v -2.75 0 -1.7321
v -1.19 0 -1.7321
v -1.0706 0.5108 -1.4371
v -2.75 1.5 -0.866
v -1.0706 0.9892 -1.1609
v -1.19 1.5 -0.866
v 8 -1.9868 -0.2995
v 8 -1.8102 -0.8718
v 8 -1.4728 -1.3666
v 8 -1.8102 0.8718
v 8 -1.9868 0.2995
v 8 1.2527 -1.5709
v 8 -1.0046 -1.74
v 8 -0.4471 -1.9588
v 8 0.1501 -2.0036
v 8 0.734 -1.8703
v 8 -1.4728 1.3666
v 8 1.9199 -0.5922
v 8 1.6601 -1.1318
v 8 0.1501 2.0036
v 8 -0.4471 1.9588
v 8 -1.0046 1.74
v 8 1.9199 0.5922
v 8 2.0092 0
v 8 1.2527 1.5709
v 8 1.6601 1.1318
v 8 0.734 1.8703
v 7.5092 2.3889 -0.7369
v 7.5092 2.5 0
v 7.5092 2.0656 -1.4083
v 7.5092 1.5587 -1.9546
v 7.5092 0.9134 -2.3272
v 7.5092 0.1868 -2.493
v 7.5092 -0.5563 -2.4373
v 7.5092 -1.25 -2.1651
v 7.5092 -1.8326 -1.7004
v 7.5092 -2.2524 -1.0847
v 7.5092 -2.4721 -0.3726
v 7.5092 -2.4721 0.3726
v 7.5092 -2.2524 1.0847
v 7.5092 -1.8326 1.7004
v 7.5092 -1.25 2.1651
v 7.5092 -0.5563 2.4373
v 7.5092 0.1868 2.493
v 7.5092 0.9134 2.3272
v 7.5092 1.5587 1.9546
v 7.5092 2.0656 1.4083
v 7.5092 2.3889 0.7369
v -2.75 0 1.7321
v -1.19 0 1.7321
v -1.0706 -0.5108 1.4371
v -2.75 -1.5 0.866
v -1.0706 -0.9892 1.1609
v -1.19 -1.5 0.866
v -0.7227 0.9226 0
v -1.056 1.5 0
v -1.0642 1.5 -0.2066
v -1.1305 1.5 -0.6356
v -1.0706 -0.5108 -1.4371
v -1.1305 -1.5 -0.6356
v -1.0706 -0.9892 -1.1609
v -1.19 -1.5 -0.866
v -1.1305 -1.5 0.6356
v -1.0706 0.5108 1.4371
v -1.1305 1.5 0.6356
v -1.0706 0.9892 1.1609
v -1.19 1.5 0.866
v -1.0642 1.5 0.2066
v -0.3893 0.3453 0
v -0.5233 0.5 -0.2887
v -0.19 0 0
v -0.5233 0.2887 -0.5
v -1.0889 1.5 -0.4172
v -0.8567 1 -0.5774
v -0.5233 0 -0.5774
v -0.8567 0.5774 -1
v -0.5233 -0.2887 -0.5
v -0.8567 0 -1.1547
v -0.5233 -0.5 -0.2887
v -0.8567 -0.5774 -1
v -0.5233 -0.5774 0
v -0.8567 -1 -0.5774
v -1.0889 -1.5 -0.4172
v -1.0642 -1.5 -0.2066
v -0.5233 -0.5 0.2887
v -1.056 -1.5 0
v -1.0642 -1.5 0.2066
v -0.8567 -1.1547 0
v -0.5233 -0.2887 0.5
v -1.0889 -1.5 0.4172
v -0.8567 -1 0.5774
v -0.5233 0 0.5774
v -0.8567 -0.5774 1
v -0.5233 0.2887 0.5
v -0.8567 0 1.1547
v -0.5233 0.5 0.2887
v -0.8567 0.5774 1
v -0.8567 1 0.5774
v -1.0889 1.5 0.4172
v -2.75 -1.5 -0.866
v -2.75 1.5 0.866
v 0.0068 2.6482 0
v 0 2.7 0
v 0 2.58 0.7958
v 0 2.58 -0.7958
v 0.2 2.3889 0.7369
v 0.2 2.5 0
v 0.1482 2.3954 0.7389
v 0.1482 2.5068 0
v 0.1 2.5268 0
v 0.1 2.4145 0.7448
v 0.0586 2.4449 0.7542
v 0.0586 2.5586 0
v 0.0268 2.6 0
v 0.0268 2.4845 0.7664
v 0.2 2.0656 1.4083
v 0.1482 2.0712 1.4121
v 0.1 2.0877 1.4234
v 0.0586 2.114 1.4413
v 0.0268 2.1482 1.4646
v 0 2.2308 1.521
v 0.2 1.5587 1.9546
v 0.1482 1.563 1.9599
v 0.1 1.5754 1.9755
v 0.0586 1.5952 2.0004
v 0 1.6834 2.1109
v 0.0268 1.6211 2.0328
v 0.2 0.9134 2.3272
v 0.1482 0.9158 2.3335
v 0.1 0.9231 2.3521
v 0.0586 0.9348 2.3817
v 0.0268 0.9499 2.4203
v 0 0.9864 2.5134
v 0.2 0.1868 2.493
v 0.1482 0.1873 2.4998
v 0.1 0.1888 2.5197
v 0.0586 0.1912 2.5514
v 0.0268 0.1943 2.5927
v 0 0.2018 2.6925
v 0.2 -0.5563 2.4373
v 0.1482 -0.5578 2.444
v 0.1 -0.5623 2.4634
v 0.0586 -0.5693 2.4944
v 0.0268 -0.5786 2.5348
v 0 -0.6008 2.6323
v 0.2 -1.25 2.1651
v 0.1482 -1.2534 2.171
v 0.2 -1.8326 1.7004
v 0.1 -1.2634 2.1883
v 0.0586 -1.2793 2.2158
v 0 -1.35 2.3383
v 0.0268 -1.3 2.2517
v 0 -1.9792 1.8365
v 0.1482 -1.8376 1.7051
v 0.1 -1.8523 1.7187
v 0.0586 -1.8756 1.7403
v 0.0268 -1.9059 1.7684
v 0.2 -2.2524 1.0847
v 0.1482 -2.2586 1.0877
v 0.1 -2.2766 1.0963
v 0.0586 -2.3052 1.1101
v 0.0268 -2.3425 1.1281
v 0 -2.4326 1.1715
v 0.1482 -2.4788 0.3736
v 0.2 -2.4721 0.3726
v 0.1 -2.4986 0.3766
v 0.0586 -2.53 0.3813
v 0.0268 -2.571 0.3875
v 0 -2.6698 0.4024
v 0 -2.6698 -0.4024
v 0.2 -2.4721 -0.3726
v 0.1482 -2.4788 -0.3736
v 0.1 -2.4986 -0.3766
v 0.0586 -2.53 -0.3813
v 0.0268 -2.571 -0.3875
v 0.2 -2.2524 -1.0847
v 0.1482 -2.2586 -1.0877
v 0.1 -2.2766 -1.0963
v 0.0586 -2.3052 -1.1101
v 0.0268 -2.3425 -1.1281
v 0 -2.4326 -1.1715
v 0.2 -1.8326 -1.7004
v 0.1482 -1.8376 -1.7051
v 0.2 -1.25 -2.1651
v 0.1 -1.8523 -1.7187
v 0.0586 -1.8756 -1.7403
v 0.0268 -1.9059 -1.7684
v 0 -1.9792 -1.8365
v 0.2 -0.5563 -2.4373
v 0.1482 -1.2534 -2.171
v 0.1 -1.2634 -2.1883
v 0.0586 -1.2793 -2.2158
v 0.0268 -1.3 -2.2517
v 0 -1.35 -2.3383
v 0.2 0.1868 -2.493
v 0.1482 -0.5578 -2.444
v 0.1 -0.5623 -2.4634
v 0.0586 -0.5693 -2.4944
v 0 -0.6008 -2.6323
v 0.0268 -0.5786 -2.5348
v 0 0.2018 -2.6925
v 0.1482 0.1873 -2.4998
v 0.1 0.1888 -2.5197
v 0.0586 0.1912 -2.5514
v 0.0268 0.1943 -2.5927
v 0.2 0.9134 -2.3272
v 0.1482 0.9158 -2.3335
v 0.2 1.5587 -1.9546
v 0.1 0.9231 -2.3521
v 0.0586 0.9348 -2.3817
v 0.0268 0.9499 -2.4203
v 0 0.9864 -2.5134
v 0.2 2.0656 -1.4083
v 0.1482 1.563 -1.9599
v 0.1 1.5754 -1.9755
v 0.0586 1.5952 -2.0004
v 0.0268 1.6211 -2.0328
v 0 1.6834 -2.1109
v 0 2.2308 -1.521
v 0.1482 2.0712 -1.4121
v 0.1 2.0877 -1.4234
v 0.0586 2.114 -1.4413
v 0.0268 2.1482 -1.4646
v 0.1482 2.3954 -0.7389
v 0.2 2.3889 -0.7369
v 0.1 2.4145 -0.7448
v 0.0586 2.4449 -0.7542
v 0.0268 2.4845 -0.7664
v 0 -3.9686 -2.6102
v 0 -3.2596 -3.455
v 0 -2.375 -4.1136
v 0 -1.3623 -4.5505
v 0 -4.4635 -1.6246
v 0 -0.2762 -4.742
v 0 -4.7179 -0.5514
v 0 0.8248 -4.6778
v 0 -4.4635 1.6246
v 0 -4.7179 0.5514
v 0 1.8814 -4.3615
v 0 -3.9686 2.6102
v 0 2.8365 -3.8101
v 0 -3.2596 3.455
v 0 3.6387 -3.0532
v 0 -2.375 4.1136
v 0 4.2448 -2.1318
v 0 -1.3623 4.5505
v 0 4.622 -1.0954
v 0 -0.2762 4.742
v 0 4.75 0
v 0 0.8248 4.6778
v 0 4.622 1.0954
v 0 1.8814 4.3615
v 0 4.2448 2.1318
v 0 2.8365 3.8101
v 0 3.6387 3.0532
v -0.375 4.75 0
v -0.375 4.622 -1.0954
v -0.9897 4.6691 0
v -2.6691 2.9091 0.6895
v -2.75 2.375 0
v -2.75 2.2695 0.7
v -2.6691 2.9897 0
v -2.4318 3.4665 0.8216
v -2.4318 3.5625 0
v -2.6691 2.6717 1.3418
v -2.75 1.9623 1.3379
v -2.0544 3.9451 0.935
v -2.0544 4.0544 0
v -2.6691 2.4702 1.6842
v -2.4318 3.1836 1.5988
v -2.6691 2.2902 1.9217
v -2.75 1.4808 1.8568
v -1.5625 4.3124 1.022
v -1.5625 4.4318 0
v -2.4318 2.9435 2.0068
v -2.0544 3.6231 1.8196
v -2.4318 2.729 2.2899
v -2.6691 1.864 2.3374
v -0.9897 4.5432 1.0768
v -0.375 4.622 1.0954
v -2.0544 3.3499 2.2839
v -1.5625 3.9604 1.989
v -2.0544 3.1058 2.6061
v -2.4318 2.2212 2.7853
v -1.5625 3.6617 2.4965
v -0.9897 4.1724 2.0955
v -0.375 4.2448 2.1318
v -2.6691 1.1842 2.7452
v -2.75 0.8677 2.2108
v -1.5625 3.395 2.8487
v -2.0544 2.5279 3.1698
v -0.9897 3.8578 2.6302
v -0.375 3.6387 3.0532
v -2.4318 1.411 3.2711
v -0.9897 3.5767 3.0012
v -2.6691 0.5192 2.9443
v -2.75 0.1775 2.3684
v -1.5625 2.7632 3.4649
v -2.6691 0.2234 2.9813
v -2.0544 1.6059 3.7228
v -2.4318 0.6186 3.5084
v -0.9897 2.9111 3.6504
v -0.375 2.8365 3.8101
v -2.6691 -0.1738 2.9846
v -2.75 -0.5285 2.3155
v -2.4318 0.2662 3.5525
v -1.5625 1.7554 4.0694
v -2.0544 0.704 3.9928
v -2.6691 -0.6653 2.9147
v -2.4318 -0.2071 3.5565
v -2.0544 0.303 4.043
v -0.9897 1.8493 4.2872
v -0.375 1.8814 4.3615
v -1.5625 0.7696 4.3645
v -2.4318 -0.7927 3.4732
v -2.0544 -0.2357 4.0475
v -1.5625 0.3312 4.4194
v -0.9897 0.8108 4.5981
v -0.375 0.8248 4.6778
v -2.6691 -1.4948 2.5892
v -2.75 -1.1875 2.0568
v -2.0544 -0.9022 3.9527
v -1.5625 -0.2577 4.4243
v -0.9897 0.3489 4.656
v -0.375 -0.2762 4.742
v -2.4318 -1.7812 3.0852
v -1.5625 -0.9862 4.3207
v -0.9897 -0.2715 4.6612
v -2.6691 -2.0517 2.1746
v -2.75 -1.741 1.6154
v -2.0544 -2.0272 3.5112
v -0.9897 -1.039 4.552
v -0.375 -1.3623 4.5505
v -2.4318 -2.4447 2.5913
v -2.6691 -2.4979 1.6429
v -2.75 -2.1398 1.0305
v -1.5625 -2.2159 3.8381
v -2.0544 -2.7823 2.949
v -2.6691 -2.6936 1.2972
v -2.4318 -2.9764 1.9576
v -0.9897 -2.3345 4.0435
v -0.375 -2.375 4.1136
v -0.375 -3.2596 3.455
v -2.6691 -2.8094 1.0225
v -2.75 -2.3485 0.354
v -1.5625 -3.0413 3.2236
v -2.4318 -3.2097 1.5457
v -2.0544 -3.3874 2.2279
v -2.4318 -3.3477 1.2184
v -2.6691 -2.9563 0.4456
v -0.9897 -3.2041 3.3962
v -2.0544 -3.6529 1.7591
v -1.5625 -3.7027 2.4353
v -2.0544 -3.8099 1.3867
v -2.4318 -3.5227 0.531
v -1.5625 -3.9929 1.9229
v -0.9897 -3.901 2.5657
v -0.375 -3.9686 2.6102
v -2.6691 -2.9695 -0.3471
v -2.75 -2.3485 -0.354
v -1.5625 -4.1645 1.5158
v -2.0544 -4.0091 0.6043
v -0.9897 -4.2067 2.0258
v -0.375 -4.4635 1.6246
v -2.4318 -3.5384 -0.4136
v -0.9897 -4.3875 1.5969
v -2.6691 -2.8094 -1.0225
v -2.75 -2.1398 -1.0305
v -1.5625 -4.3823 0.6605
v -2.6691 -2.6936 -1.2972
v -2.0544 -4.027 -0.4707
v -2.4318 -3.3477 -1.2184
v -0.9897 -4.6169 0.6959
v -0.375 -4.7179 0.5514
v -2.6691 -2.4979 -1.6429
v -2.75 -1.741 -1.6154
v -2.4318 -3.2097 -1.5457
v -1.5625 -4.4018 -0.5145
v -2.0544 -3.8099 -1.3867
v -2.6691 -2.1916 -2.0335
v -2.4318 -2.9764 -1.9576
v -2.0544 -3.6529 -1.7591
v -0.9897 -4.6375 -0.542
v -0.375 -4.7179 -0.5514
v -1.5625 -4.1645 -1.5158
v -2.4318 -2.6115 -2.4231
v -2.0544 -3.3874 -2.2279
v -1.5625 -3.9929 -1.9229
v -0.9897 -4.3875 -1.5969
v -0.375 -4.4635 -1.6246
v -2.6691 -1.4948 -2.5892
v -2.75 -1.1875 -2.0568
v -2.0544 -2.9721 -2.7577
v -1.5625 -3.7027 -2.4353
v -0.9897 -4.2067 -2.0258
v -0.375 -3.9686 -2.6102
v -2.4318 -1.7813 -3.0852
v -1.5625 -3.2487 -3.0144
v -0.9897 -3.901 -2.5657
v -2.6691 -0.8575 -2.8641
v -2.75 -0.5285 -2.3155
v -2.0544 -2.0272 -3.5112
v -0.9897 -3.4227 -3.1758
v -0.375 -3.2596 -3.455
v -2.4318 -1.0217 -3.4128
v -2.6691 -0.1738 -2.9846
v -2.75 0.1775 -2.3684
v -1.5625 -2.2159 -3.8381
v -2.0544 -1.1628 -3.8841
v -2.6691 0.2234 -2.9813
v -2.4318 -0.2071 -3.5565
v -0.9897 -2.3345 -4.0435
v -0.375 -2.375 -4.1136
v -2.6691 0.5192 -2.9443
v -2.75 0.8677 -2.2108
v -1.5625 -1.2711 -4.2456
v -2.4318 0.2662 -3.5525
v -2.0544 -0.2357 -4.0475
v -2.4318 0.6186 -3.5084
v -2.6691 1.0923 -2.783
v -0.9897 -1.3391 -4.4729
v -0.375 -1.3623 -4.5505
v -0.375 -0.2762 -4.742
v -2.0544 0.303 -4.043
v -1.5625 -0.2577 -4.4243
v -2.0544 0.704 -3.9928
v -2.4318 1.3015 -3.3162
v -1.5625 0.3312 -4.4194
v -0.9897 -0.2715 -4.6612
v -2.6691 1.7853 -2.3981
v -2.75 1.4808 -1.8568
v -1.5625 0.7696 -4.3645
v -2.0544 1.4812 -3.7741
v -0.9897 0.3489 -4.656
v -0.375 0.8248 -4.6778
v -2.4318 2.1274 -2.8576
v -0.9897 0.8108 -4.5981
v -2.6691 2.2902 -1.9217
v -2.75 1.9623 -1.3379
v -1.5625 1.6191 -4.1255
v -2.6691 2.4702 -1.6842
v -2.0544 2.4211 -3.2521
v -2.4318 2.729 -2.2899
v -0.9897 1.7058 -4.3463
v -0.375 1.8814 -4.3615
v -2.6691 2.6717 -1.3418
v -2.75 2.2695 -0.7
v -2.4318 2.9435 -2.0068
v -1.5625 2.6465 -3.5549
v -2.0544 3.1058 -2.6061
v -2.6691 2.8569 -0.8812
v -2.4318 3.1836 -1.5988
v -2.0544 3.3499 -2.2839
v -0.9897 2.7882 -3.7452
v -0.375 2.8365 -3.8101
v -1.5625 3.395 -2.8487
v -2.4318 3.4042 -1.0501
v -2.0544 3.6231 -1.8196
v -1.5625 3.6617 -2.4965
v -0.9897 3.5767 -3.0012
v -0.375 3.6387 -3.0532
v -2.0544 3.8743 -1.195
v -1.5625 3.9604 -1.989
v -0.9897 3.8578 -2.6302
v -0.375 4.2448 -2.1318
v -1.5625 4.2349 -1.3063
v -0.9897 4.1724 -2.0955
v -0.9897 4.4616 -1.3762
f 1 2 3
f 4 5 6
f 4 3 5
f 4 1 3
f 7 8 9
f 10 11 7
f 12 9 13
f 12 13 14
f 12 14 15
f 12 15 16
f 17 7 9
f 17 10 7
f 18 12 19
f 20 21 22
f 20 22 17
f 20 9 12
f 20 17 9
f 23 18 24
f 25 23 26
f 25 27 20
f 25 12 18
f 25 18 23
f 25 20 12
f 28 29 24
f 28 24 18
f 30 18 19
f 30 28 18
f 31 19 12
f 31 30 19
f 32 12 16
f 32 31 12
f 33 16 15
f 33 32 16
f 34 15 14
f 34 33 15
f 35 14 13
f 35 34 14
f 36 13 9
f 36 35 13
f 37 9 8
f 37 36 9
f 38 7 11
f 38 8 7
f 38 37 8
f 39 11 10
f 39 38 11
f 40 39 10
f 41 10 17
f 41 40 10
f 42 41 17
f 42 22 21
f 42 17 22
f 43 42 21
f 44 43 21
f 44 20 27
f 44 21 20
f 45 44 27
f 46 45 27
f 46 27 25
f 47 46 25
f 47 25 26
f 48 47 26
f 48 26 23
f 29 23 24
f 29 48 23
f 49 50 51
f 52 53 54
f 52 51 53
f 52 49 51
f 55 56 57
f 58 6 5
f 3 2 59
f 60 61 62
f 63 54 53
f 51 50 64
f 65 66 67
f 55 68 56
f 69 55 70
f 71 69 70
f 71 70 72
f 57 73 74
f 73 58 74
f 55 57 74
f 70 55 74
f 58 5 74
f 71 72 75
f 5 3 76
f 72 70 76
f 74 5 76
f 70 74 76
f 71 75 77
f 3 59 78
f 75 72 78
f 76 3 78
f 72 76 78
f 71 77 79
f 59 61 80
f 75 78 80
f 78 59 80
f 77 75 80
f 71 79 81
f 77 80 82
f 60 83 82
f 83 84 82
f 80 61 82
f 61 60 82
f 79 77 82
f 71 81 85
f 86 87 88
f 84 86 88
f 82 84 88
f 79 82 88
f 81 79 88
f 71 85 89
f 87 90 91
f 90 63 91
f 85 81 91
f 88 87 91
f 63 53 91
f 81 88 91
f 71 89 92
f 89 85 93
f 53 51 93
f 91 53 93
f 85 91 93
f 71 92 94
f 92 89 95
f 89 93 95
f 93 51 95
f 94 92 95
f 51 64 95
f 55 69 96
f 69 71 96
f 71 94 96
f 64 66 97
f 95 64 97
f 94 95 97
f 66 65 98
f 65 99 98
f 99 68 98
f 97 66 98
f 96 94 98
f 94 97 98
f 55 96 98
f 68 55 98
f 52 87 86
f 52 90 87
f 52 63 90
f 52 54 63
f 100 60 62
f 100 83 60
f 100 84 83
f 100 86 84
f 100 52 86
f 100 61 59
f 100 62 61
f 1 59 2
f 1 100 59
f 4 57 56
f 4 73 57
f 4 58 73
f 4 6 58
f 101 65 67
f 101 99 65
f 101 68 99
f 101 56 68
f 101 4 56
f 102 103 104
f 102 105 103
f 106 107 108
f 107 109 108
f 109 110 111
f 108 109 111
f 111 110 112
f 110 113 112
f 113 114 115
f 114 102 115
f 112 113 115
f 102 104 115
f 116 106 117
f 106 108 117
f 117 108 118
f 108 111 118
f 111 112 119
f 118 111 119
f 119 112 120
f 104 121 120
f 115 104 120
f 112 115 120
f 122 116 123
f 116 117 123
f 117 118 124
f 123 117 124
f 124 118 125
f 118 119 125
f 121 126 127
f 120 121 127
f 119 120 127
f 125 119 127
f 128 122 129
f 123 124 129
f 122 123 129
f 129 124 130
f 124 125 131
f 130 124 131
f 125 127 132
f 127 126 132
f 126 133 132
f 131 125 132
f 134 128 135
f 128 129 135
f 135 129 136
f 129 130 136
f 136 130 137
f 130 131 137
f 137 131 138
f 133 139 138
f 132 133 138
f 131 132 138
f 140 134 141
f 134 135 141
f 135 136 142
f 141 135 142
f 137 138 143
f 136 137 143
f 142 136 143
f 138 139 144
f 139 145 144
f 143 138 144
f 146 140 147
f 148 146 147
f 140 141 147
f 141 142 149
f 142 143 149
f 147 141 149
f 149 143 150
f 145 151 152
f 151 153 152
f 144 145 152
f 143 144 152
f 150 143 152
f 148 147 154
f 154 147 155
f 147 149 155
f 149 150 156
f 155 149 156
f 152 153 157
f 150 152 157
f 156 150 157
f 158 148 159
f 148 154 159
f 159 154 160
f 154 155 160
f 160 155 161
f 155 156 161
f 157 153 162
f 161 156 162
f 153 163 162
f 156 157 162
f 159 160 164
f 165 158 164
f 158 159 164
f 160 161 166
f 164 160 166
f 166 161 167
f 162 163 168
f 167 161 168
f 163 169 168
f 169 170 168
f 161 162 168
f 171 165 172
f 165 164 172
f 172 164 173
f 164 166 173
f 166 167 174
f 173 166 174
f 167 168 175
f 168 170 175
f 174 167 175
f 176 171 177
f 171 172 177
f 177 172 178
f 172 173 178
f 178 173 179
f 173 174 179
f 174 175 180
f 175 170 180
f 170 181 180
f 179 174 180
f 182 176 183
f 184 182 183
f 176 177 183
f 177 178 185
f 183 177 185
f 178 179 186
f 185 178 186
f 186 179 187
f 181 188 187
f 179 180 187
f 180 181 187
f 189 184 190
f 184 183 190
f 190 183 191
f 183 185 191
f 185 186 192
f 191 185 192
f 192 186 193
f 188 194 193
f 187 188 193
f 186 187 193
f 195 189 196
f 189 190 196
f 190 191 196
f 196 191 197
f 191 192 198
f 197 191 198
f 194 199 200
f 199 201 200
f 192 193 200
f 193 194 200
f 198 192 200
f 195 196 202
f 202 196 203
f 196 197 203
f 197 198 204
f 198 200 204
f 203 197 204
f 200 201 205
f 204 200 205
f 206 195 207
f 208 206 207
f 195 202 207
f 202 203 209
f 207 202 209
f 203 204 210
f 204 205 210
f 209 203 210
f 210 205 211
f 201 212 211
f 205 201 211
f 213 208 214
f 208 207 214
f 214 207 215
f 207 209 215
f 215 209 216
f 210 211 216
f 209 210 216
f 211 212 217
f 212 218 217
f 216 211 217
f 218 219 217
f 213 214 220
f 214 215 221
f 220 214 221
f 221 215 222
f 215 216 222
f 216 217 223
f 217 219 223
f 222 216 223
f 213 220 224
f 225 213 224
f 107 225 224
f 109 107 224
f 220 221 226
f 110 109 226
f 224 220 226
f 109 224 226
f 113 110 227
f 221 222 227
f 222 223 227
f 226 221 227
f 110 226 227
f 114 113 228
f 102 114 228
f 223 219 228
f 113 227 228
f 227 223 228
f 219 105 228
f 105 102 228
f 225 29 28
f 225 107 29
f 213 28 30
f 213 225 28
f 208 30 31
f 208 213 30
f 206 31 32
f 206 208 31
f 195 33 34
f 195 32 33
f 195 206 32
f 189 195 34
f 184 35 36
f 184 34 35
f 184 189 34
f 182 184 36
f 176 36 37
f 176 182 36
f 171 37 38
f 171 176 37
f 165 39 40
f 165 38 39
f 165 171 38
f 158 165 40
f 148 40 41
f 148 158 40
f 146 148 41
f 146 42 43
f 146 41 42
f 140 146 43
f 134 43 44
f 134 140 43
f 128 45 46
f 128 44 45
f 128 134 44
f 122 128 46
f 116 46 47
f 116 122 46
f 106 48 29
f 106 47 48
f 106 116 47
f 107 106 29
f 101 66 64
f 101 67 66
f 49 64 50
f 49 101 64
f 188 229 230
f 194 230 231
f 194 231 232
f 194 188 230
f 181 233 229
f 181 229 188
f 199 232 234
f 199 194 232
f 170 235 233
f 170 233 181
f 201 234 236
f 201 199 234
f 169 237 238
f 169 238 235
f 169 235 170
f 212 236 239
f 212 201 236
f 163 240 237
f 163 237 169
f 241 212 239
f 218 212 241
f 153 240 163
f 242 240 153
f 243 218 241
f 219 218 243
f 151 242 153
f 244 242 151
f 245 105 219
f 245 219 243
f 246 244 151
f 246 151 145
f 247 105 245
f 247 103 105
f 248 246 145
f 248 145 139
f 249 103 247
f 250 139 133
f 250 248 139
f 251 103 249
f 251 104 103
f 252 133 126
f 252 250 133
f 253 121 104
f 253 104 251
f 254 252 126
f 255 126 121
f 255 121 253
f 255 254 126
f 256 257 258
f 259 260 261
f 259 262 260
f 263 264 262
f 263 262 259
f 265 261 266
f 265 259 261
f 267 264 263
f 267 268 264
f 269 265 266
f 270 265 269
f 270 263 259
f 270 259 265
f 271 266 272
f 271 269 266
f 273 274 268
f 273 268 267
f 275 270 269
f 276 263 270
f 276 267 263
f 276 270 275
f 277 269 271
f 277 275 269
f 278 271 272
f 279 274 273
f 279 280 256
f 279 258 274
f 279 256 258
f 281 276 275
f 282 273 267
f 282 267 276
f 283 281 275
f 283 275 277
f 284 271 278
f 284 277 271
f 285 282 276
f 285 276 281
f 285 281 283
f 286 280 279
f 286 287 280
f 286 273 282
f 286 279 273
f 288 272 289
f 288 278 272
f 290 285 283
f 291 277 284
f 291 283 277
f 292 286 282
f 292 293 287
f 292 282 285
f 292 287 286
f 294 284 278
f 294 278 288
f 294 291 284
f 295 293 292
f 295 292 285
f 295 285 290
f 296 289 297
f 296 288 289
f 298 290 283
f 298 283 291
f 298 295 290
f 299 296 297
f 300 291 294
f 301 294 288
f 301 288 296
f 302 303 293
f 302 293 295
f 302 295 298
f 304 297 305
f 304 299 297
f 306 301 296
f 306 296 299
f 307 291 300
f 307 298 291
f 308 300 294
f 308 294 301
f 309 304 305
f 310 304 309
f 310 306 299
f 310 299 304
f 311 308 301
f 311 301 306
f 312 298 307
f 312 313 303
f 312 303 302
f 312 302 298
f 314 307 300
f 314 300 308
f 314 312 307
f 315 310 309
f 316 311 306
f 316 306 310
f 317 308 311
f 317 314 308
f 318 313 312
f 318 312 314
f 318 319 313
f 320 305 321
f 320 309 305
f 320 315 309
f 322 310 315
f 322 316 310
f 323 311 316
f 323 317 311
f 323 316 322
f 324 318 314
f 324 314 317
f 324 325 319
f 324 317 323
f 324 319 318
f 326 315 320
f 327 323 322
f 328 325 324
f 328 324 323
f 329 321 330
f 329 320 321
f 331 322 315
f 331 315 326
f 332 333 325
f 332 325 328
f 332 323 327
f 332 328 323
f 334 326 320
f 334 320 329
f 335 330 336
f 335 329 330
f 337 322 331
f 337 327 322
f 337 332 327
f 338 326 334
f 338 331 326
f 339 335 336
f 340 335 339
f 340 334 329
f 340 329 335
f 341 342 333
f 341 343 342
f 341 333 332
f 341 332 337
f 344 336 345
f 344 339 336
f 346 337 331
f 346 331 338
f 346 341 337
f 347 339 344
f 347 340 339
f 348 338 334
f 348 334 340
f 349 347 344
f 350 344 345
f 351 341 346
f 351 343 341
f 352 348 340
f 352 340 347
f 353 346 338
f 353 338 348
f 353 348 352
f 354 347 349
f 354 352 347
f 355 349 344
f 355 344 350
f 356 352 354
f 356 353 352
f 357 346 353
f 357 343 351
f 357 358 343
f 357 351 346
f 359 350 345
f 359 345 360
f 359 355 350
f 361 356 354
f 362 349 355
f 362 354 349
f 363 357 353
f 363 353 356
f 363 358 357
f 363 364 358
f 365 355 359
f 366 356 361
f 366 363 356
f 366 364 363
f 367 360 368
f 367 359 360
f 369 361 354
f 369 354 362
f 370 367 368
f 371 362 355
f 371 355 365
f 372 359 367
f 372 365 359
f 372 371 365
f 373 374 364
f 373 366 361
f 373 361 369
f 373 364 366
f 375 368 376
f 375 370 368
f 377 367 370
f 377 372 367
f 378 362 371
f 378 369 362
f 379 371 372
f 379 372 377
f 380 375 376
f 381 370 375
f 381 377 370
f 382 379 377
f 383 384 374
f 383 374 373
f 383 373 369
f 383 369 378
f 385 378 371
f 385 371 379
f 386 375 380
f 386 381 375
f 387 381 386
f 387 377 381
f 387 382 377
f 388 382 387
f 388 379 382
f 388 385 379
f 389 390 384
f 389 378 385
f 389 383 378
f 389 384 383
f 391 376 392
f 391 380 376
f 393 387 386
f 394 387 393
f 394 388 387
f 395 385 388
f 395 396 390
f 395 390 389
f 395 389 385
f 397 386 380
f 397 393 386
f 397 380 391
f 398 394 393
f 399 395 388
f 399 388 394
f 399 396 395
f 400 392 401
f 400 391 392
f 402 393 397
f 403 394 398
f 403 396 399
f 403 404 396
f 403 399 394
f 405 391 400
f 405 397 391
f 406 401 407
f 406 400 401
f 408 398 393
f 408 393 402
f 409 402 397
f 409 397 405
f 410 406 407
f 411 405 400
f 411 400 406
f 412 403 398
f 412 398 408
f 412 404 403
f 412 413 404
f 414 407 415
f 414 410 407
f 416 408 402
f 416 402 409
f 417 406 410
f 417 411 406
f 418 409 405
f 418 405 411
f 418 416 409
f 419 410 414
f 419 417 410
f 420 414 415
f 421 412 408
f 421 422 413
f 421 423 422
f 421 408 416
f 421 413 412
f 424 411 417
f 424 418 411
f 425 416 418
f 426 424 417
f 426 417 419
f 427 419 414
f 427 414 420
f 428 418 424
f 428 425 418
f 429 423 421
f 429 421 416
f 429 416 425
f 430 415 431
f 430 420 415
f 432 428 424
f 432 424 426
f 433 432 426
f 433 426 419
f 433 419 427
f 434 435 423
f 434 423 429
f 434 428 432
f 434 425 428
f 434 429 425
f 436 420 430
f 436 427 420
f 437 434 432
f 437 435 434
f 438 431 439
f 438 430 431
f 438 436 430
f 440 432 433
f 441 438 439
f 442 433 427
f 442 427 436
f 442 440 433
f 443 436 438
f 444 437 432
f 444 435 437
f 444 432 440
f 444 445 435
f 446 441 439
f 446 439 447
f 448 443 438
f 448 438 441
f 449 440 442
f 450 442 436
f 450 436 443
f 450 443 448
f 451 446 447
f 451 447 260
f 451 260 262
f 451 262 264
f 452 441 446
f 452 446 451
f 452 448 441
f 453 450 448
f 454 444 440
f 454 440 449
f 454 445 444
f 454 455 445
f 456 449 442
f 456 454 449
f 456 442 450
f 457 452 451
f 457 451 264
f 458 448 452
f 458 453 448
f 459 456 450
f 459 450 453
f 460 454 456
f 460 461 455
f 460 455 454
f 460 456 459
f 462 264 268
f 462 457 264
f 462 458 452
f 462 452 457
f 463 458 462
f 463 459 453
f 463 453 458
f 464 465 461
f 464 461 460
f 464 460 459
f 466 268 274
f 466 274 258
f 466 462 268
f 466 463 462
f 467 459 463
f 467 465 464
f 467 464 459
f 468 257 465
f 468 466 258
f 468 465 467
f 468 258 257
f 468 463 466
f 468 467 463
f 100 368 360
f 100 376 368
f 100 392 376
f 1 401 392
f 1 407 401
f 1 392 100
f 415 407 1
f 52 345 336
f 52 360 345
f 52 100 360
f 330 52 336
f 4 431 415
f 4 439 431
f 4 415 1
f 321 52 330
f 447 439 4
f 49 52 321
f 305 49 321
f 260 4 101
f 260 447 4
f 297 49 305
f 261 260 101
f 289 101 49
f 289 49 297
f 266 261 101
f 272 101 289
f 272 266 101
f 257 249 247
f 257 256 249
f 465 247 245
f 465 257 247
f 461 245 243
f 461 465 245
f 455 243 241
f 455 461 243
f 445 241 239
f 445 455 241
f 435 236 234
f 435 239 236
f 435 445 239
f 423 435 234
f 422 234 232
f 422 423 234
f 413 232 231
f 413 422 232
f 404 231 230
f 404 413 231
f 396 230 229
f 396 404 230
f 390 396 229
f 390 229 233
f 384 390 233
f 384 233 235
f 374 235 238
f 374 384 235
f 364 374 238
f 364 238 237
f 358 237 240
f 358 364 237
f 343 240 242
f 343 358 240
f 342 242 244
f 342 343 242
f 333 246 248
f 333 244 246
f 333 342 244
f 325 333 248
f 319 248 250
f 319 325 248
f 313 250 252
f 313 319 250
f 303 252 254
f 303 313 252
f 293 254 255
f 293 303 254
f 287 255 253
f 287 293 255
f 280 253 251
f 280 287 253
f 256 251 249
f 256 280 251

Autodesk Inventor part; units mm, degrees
ref_plane "YZ Plane" through (0, 0, 0) normal (1, 0, 0) x (0, 1, 0)
ref_plane "XZ Plane" through (0, 0, 0) normal (0, 1, 0) x (-1, 0, 0)
sketch "Эскиз1" plane through (0, 0, 0) normal (0, 0, 1) x (1, 0, 0)
  line L0 (-0.19, 0) -> (8, 0)
  line L1 (8, 0) -> (8, 2.5)
  line L2 (8, 2.5) -> (1.6, 2.5)
  line L3 (1.6, 2.5) -> (1.1092, 2.5)
  line L4 (1.1092, 2.5) -> (0, 2.5)
  line L5 (0, 2.5) -> (0, 4.75)
  line L6 (0, 4.75) -> (-2.75, 4.75)
  line L7 (-2.75, 4.75) -> (-2.75, 1.7321)
  line L8 (-2.75, 1.7321) -> (-1.19, 1.7321)
  line L9 (-1.19, 1.7321) -> (-0.19, 0)
  line L10 (-4.9, 0) -> (10.15, 0) projected
  line L11 (0, -0.95) -> (0, 5.7) projected
  line L12 (1.6, 2.5) -> (0, 2.5) construction
  dimension "d0" = 6.4
  dimension "d1" = 0.4908
  dimension "d2" = 2.75
  dimension "d3" = 1.56
  dimension "d4" = 60
  dimension "d5" = 5
  dimension "d6" = 5
  dimension "d7" = 3.4641
  dimension "d8" = 9.5
  dimension "d19" = 8
revolve "Базовый элемент" add sketch "Эскиз1" angle 360 about axis through (-0.19, 0, 0) along (1, 0, 0)
sketch "Эскиз2" plane through (-2.75, 0, 0) normal (-1, 0, 0) x (0, 0, 1)
  circle A0 centre (0, 0) radius 1.7321 projected
  line L0 (0, -6.65) -> (0, 6.65) projected
  line L1 (-6.65, 0) -> (6.65, 0) projected
  line L2 (1.7321, 0) -> (0.866, -1.5)
  line L3 (0.866, -1.5) -> (-0.866, -1.5)
  line L4 (-0.866, -1.5) -> (-1.7321, 0)
  line L5 (-1.7321, 0) -> (-0.866, 1.5)
  line L6 (-0.866, 1.5) -> (0.866, 1.5)
  line L7 (0.866, 1.5) -> (1.7321, 0)
extrude "Паз" add sketch "Эскиз2" against normal up to next contours L7 A0 | A0 L2 | L6 L0 A0 | A0 L0 L3 | L0 L6 A0 | A0 L3 L0 | L4 A0 | A0 L5
fillet "Сопряжение1" radius 2.375 1 edges at (-2.75, -4.75, 0)
thread "Резьба" size "M5x0.8" class "4g6g" standard "ANSI Metric M Profile" length 6.4
chamfer "Фаска1" distance 0.4908 distance2 0.4908 1 edges at (8, -2.5, 0) measured on face at (8, -0.6238, -0.819)
fillet "Сопряжение2" radius 0.2 1 edges at (0, -2.5, 0)
ref_plane "Work Plane1" through (30, 0, 0) normal (0, -0.5, 0.866) x (1, 0, 0)
equation "\"d0\" = GEL"
equation "\"d1\" = GAL"
equation "\"d2\" = KOH"
equation "\"d3\" = INTI"
equation "\"d5\" = GD"
equation "\"d6\" = BDM"
equation "\"d7\" = 1.1547 * SW"
equation "\"d8\" = KOD"
equation "\"d19\" = NLG"
equation "\"d16\" = RR"
equation "\"d12\" = GEL"
equation "\"d14\" = -0.5 * SPD + 0.5 * GD"
equation "\"d15\" = GUL"
equation "\"d29\" = R"
equation "\"GD\" = NND"
equation "\"NLG\" = 8"
equation "\"GEL\" = 6.4"
equation "\"KOD\" = 9.5"
equation "\"KOH\" = 2.75"
equation "\"INTI\" = 1.56"
equation "\"GAL\" = 0.61345 * PTC"
equation "\"GUL\" = 0.61345 * PTC"
equation "\"BDM\" = NND"
equation "\"SW\" = 3"
equation "\"RR\" = 2.375"
equation "\"SPD\" = 4.01848"
equation "\"d28\" = R"
equation "\"R\" = 0.2"
equation "\"TOA\" = 30deg"
equation "\"THREADDIA\" = 5"
equation "\"KOD1\" = KOD - 2 * RR"
equation "\"PTC\" = 0.8"
equation "\"NND\" = 5"
equation "\"E0\" = 1.155 * SW"
equation "\"GD1\" = THREADDIA - 1.2269 * PTC"
properties part number "ANSI B18.3.4M - M5 x 0.8 x 8, BHSBHCSM" material "Сталь, мягкая"
